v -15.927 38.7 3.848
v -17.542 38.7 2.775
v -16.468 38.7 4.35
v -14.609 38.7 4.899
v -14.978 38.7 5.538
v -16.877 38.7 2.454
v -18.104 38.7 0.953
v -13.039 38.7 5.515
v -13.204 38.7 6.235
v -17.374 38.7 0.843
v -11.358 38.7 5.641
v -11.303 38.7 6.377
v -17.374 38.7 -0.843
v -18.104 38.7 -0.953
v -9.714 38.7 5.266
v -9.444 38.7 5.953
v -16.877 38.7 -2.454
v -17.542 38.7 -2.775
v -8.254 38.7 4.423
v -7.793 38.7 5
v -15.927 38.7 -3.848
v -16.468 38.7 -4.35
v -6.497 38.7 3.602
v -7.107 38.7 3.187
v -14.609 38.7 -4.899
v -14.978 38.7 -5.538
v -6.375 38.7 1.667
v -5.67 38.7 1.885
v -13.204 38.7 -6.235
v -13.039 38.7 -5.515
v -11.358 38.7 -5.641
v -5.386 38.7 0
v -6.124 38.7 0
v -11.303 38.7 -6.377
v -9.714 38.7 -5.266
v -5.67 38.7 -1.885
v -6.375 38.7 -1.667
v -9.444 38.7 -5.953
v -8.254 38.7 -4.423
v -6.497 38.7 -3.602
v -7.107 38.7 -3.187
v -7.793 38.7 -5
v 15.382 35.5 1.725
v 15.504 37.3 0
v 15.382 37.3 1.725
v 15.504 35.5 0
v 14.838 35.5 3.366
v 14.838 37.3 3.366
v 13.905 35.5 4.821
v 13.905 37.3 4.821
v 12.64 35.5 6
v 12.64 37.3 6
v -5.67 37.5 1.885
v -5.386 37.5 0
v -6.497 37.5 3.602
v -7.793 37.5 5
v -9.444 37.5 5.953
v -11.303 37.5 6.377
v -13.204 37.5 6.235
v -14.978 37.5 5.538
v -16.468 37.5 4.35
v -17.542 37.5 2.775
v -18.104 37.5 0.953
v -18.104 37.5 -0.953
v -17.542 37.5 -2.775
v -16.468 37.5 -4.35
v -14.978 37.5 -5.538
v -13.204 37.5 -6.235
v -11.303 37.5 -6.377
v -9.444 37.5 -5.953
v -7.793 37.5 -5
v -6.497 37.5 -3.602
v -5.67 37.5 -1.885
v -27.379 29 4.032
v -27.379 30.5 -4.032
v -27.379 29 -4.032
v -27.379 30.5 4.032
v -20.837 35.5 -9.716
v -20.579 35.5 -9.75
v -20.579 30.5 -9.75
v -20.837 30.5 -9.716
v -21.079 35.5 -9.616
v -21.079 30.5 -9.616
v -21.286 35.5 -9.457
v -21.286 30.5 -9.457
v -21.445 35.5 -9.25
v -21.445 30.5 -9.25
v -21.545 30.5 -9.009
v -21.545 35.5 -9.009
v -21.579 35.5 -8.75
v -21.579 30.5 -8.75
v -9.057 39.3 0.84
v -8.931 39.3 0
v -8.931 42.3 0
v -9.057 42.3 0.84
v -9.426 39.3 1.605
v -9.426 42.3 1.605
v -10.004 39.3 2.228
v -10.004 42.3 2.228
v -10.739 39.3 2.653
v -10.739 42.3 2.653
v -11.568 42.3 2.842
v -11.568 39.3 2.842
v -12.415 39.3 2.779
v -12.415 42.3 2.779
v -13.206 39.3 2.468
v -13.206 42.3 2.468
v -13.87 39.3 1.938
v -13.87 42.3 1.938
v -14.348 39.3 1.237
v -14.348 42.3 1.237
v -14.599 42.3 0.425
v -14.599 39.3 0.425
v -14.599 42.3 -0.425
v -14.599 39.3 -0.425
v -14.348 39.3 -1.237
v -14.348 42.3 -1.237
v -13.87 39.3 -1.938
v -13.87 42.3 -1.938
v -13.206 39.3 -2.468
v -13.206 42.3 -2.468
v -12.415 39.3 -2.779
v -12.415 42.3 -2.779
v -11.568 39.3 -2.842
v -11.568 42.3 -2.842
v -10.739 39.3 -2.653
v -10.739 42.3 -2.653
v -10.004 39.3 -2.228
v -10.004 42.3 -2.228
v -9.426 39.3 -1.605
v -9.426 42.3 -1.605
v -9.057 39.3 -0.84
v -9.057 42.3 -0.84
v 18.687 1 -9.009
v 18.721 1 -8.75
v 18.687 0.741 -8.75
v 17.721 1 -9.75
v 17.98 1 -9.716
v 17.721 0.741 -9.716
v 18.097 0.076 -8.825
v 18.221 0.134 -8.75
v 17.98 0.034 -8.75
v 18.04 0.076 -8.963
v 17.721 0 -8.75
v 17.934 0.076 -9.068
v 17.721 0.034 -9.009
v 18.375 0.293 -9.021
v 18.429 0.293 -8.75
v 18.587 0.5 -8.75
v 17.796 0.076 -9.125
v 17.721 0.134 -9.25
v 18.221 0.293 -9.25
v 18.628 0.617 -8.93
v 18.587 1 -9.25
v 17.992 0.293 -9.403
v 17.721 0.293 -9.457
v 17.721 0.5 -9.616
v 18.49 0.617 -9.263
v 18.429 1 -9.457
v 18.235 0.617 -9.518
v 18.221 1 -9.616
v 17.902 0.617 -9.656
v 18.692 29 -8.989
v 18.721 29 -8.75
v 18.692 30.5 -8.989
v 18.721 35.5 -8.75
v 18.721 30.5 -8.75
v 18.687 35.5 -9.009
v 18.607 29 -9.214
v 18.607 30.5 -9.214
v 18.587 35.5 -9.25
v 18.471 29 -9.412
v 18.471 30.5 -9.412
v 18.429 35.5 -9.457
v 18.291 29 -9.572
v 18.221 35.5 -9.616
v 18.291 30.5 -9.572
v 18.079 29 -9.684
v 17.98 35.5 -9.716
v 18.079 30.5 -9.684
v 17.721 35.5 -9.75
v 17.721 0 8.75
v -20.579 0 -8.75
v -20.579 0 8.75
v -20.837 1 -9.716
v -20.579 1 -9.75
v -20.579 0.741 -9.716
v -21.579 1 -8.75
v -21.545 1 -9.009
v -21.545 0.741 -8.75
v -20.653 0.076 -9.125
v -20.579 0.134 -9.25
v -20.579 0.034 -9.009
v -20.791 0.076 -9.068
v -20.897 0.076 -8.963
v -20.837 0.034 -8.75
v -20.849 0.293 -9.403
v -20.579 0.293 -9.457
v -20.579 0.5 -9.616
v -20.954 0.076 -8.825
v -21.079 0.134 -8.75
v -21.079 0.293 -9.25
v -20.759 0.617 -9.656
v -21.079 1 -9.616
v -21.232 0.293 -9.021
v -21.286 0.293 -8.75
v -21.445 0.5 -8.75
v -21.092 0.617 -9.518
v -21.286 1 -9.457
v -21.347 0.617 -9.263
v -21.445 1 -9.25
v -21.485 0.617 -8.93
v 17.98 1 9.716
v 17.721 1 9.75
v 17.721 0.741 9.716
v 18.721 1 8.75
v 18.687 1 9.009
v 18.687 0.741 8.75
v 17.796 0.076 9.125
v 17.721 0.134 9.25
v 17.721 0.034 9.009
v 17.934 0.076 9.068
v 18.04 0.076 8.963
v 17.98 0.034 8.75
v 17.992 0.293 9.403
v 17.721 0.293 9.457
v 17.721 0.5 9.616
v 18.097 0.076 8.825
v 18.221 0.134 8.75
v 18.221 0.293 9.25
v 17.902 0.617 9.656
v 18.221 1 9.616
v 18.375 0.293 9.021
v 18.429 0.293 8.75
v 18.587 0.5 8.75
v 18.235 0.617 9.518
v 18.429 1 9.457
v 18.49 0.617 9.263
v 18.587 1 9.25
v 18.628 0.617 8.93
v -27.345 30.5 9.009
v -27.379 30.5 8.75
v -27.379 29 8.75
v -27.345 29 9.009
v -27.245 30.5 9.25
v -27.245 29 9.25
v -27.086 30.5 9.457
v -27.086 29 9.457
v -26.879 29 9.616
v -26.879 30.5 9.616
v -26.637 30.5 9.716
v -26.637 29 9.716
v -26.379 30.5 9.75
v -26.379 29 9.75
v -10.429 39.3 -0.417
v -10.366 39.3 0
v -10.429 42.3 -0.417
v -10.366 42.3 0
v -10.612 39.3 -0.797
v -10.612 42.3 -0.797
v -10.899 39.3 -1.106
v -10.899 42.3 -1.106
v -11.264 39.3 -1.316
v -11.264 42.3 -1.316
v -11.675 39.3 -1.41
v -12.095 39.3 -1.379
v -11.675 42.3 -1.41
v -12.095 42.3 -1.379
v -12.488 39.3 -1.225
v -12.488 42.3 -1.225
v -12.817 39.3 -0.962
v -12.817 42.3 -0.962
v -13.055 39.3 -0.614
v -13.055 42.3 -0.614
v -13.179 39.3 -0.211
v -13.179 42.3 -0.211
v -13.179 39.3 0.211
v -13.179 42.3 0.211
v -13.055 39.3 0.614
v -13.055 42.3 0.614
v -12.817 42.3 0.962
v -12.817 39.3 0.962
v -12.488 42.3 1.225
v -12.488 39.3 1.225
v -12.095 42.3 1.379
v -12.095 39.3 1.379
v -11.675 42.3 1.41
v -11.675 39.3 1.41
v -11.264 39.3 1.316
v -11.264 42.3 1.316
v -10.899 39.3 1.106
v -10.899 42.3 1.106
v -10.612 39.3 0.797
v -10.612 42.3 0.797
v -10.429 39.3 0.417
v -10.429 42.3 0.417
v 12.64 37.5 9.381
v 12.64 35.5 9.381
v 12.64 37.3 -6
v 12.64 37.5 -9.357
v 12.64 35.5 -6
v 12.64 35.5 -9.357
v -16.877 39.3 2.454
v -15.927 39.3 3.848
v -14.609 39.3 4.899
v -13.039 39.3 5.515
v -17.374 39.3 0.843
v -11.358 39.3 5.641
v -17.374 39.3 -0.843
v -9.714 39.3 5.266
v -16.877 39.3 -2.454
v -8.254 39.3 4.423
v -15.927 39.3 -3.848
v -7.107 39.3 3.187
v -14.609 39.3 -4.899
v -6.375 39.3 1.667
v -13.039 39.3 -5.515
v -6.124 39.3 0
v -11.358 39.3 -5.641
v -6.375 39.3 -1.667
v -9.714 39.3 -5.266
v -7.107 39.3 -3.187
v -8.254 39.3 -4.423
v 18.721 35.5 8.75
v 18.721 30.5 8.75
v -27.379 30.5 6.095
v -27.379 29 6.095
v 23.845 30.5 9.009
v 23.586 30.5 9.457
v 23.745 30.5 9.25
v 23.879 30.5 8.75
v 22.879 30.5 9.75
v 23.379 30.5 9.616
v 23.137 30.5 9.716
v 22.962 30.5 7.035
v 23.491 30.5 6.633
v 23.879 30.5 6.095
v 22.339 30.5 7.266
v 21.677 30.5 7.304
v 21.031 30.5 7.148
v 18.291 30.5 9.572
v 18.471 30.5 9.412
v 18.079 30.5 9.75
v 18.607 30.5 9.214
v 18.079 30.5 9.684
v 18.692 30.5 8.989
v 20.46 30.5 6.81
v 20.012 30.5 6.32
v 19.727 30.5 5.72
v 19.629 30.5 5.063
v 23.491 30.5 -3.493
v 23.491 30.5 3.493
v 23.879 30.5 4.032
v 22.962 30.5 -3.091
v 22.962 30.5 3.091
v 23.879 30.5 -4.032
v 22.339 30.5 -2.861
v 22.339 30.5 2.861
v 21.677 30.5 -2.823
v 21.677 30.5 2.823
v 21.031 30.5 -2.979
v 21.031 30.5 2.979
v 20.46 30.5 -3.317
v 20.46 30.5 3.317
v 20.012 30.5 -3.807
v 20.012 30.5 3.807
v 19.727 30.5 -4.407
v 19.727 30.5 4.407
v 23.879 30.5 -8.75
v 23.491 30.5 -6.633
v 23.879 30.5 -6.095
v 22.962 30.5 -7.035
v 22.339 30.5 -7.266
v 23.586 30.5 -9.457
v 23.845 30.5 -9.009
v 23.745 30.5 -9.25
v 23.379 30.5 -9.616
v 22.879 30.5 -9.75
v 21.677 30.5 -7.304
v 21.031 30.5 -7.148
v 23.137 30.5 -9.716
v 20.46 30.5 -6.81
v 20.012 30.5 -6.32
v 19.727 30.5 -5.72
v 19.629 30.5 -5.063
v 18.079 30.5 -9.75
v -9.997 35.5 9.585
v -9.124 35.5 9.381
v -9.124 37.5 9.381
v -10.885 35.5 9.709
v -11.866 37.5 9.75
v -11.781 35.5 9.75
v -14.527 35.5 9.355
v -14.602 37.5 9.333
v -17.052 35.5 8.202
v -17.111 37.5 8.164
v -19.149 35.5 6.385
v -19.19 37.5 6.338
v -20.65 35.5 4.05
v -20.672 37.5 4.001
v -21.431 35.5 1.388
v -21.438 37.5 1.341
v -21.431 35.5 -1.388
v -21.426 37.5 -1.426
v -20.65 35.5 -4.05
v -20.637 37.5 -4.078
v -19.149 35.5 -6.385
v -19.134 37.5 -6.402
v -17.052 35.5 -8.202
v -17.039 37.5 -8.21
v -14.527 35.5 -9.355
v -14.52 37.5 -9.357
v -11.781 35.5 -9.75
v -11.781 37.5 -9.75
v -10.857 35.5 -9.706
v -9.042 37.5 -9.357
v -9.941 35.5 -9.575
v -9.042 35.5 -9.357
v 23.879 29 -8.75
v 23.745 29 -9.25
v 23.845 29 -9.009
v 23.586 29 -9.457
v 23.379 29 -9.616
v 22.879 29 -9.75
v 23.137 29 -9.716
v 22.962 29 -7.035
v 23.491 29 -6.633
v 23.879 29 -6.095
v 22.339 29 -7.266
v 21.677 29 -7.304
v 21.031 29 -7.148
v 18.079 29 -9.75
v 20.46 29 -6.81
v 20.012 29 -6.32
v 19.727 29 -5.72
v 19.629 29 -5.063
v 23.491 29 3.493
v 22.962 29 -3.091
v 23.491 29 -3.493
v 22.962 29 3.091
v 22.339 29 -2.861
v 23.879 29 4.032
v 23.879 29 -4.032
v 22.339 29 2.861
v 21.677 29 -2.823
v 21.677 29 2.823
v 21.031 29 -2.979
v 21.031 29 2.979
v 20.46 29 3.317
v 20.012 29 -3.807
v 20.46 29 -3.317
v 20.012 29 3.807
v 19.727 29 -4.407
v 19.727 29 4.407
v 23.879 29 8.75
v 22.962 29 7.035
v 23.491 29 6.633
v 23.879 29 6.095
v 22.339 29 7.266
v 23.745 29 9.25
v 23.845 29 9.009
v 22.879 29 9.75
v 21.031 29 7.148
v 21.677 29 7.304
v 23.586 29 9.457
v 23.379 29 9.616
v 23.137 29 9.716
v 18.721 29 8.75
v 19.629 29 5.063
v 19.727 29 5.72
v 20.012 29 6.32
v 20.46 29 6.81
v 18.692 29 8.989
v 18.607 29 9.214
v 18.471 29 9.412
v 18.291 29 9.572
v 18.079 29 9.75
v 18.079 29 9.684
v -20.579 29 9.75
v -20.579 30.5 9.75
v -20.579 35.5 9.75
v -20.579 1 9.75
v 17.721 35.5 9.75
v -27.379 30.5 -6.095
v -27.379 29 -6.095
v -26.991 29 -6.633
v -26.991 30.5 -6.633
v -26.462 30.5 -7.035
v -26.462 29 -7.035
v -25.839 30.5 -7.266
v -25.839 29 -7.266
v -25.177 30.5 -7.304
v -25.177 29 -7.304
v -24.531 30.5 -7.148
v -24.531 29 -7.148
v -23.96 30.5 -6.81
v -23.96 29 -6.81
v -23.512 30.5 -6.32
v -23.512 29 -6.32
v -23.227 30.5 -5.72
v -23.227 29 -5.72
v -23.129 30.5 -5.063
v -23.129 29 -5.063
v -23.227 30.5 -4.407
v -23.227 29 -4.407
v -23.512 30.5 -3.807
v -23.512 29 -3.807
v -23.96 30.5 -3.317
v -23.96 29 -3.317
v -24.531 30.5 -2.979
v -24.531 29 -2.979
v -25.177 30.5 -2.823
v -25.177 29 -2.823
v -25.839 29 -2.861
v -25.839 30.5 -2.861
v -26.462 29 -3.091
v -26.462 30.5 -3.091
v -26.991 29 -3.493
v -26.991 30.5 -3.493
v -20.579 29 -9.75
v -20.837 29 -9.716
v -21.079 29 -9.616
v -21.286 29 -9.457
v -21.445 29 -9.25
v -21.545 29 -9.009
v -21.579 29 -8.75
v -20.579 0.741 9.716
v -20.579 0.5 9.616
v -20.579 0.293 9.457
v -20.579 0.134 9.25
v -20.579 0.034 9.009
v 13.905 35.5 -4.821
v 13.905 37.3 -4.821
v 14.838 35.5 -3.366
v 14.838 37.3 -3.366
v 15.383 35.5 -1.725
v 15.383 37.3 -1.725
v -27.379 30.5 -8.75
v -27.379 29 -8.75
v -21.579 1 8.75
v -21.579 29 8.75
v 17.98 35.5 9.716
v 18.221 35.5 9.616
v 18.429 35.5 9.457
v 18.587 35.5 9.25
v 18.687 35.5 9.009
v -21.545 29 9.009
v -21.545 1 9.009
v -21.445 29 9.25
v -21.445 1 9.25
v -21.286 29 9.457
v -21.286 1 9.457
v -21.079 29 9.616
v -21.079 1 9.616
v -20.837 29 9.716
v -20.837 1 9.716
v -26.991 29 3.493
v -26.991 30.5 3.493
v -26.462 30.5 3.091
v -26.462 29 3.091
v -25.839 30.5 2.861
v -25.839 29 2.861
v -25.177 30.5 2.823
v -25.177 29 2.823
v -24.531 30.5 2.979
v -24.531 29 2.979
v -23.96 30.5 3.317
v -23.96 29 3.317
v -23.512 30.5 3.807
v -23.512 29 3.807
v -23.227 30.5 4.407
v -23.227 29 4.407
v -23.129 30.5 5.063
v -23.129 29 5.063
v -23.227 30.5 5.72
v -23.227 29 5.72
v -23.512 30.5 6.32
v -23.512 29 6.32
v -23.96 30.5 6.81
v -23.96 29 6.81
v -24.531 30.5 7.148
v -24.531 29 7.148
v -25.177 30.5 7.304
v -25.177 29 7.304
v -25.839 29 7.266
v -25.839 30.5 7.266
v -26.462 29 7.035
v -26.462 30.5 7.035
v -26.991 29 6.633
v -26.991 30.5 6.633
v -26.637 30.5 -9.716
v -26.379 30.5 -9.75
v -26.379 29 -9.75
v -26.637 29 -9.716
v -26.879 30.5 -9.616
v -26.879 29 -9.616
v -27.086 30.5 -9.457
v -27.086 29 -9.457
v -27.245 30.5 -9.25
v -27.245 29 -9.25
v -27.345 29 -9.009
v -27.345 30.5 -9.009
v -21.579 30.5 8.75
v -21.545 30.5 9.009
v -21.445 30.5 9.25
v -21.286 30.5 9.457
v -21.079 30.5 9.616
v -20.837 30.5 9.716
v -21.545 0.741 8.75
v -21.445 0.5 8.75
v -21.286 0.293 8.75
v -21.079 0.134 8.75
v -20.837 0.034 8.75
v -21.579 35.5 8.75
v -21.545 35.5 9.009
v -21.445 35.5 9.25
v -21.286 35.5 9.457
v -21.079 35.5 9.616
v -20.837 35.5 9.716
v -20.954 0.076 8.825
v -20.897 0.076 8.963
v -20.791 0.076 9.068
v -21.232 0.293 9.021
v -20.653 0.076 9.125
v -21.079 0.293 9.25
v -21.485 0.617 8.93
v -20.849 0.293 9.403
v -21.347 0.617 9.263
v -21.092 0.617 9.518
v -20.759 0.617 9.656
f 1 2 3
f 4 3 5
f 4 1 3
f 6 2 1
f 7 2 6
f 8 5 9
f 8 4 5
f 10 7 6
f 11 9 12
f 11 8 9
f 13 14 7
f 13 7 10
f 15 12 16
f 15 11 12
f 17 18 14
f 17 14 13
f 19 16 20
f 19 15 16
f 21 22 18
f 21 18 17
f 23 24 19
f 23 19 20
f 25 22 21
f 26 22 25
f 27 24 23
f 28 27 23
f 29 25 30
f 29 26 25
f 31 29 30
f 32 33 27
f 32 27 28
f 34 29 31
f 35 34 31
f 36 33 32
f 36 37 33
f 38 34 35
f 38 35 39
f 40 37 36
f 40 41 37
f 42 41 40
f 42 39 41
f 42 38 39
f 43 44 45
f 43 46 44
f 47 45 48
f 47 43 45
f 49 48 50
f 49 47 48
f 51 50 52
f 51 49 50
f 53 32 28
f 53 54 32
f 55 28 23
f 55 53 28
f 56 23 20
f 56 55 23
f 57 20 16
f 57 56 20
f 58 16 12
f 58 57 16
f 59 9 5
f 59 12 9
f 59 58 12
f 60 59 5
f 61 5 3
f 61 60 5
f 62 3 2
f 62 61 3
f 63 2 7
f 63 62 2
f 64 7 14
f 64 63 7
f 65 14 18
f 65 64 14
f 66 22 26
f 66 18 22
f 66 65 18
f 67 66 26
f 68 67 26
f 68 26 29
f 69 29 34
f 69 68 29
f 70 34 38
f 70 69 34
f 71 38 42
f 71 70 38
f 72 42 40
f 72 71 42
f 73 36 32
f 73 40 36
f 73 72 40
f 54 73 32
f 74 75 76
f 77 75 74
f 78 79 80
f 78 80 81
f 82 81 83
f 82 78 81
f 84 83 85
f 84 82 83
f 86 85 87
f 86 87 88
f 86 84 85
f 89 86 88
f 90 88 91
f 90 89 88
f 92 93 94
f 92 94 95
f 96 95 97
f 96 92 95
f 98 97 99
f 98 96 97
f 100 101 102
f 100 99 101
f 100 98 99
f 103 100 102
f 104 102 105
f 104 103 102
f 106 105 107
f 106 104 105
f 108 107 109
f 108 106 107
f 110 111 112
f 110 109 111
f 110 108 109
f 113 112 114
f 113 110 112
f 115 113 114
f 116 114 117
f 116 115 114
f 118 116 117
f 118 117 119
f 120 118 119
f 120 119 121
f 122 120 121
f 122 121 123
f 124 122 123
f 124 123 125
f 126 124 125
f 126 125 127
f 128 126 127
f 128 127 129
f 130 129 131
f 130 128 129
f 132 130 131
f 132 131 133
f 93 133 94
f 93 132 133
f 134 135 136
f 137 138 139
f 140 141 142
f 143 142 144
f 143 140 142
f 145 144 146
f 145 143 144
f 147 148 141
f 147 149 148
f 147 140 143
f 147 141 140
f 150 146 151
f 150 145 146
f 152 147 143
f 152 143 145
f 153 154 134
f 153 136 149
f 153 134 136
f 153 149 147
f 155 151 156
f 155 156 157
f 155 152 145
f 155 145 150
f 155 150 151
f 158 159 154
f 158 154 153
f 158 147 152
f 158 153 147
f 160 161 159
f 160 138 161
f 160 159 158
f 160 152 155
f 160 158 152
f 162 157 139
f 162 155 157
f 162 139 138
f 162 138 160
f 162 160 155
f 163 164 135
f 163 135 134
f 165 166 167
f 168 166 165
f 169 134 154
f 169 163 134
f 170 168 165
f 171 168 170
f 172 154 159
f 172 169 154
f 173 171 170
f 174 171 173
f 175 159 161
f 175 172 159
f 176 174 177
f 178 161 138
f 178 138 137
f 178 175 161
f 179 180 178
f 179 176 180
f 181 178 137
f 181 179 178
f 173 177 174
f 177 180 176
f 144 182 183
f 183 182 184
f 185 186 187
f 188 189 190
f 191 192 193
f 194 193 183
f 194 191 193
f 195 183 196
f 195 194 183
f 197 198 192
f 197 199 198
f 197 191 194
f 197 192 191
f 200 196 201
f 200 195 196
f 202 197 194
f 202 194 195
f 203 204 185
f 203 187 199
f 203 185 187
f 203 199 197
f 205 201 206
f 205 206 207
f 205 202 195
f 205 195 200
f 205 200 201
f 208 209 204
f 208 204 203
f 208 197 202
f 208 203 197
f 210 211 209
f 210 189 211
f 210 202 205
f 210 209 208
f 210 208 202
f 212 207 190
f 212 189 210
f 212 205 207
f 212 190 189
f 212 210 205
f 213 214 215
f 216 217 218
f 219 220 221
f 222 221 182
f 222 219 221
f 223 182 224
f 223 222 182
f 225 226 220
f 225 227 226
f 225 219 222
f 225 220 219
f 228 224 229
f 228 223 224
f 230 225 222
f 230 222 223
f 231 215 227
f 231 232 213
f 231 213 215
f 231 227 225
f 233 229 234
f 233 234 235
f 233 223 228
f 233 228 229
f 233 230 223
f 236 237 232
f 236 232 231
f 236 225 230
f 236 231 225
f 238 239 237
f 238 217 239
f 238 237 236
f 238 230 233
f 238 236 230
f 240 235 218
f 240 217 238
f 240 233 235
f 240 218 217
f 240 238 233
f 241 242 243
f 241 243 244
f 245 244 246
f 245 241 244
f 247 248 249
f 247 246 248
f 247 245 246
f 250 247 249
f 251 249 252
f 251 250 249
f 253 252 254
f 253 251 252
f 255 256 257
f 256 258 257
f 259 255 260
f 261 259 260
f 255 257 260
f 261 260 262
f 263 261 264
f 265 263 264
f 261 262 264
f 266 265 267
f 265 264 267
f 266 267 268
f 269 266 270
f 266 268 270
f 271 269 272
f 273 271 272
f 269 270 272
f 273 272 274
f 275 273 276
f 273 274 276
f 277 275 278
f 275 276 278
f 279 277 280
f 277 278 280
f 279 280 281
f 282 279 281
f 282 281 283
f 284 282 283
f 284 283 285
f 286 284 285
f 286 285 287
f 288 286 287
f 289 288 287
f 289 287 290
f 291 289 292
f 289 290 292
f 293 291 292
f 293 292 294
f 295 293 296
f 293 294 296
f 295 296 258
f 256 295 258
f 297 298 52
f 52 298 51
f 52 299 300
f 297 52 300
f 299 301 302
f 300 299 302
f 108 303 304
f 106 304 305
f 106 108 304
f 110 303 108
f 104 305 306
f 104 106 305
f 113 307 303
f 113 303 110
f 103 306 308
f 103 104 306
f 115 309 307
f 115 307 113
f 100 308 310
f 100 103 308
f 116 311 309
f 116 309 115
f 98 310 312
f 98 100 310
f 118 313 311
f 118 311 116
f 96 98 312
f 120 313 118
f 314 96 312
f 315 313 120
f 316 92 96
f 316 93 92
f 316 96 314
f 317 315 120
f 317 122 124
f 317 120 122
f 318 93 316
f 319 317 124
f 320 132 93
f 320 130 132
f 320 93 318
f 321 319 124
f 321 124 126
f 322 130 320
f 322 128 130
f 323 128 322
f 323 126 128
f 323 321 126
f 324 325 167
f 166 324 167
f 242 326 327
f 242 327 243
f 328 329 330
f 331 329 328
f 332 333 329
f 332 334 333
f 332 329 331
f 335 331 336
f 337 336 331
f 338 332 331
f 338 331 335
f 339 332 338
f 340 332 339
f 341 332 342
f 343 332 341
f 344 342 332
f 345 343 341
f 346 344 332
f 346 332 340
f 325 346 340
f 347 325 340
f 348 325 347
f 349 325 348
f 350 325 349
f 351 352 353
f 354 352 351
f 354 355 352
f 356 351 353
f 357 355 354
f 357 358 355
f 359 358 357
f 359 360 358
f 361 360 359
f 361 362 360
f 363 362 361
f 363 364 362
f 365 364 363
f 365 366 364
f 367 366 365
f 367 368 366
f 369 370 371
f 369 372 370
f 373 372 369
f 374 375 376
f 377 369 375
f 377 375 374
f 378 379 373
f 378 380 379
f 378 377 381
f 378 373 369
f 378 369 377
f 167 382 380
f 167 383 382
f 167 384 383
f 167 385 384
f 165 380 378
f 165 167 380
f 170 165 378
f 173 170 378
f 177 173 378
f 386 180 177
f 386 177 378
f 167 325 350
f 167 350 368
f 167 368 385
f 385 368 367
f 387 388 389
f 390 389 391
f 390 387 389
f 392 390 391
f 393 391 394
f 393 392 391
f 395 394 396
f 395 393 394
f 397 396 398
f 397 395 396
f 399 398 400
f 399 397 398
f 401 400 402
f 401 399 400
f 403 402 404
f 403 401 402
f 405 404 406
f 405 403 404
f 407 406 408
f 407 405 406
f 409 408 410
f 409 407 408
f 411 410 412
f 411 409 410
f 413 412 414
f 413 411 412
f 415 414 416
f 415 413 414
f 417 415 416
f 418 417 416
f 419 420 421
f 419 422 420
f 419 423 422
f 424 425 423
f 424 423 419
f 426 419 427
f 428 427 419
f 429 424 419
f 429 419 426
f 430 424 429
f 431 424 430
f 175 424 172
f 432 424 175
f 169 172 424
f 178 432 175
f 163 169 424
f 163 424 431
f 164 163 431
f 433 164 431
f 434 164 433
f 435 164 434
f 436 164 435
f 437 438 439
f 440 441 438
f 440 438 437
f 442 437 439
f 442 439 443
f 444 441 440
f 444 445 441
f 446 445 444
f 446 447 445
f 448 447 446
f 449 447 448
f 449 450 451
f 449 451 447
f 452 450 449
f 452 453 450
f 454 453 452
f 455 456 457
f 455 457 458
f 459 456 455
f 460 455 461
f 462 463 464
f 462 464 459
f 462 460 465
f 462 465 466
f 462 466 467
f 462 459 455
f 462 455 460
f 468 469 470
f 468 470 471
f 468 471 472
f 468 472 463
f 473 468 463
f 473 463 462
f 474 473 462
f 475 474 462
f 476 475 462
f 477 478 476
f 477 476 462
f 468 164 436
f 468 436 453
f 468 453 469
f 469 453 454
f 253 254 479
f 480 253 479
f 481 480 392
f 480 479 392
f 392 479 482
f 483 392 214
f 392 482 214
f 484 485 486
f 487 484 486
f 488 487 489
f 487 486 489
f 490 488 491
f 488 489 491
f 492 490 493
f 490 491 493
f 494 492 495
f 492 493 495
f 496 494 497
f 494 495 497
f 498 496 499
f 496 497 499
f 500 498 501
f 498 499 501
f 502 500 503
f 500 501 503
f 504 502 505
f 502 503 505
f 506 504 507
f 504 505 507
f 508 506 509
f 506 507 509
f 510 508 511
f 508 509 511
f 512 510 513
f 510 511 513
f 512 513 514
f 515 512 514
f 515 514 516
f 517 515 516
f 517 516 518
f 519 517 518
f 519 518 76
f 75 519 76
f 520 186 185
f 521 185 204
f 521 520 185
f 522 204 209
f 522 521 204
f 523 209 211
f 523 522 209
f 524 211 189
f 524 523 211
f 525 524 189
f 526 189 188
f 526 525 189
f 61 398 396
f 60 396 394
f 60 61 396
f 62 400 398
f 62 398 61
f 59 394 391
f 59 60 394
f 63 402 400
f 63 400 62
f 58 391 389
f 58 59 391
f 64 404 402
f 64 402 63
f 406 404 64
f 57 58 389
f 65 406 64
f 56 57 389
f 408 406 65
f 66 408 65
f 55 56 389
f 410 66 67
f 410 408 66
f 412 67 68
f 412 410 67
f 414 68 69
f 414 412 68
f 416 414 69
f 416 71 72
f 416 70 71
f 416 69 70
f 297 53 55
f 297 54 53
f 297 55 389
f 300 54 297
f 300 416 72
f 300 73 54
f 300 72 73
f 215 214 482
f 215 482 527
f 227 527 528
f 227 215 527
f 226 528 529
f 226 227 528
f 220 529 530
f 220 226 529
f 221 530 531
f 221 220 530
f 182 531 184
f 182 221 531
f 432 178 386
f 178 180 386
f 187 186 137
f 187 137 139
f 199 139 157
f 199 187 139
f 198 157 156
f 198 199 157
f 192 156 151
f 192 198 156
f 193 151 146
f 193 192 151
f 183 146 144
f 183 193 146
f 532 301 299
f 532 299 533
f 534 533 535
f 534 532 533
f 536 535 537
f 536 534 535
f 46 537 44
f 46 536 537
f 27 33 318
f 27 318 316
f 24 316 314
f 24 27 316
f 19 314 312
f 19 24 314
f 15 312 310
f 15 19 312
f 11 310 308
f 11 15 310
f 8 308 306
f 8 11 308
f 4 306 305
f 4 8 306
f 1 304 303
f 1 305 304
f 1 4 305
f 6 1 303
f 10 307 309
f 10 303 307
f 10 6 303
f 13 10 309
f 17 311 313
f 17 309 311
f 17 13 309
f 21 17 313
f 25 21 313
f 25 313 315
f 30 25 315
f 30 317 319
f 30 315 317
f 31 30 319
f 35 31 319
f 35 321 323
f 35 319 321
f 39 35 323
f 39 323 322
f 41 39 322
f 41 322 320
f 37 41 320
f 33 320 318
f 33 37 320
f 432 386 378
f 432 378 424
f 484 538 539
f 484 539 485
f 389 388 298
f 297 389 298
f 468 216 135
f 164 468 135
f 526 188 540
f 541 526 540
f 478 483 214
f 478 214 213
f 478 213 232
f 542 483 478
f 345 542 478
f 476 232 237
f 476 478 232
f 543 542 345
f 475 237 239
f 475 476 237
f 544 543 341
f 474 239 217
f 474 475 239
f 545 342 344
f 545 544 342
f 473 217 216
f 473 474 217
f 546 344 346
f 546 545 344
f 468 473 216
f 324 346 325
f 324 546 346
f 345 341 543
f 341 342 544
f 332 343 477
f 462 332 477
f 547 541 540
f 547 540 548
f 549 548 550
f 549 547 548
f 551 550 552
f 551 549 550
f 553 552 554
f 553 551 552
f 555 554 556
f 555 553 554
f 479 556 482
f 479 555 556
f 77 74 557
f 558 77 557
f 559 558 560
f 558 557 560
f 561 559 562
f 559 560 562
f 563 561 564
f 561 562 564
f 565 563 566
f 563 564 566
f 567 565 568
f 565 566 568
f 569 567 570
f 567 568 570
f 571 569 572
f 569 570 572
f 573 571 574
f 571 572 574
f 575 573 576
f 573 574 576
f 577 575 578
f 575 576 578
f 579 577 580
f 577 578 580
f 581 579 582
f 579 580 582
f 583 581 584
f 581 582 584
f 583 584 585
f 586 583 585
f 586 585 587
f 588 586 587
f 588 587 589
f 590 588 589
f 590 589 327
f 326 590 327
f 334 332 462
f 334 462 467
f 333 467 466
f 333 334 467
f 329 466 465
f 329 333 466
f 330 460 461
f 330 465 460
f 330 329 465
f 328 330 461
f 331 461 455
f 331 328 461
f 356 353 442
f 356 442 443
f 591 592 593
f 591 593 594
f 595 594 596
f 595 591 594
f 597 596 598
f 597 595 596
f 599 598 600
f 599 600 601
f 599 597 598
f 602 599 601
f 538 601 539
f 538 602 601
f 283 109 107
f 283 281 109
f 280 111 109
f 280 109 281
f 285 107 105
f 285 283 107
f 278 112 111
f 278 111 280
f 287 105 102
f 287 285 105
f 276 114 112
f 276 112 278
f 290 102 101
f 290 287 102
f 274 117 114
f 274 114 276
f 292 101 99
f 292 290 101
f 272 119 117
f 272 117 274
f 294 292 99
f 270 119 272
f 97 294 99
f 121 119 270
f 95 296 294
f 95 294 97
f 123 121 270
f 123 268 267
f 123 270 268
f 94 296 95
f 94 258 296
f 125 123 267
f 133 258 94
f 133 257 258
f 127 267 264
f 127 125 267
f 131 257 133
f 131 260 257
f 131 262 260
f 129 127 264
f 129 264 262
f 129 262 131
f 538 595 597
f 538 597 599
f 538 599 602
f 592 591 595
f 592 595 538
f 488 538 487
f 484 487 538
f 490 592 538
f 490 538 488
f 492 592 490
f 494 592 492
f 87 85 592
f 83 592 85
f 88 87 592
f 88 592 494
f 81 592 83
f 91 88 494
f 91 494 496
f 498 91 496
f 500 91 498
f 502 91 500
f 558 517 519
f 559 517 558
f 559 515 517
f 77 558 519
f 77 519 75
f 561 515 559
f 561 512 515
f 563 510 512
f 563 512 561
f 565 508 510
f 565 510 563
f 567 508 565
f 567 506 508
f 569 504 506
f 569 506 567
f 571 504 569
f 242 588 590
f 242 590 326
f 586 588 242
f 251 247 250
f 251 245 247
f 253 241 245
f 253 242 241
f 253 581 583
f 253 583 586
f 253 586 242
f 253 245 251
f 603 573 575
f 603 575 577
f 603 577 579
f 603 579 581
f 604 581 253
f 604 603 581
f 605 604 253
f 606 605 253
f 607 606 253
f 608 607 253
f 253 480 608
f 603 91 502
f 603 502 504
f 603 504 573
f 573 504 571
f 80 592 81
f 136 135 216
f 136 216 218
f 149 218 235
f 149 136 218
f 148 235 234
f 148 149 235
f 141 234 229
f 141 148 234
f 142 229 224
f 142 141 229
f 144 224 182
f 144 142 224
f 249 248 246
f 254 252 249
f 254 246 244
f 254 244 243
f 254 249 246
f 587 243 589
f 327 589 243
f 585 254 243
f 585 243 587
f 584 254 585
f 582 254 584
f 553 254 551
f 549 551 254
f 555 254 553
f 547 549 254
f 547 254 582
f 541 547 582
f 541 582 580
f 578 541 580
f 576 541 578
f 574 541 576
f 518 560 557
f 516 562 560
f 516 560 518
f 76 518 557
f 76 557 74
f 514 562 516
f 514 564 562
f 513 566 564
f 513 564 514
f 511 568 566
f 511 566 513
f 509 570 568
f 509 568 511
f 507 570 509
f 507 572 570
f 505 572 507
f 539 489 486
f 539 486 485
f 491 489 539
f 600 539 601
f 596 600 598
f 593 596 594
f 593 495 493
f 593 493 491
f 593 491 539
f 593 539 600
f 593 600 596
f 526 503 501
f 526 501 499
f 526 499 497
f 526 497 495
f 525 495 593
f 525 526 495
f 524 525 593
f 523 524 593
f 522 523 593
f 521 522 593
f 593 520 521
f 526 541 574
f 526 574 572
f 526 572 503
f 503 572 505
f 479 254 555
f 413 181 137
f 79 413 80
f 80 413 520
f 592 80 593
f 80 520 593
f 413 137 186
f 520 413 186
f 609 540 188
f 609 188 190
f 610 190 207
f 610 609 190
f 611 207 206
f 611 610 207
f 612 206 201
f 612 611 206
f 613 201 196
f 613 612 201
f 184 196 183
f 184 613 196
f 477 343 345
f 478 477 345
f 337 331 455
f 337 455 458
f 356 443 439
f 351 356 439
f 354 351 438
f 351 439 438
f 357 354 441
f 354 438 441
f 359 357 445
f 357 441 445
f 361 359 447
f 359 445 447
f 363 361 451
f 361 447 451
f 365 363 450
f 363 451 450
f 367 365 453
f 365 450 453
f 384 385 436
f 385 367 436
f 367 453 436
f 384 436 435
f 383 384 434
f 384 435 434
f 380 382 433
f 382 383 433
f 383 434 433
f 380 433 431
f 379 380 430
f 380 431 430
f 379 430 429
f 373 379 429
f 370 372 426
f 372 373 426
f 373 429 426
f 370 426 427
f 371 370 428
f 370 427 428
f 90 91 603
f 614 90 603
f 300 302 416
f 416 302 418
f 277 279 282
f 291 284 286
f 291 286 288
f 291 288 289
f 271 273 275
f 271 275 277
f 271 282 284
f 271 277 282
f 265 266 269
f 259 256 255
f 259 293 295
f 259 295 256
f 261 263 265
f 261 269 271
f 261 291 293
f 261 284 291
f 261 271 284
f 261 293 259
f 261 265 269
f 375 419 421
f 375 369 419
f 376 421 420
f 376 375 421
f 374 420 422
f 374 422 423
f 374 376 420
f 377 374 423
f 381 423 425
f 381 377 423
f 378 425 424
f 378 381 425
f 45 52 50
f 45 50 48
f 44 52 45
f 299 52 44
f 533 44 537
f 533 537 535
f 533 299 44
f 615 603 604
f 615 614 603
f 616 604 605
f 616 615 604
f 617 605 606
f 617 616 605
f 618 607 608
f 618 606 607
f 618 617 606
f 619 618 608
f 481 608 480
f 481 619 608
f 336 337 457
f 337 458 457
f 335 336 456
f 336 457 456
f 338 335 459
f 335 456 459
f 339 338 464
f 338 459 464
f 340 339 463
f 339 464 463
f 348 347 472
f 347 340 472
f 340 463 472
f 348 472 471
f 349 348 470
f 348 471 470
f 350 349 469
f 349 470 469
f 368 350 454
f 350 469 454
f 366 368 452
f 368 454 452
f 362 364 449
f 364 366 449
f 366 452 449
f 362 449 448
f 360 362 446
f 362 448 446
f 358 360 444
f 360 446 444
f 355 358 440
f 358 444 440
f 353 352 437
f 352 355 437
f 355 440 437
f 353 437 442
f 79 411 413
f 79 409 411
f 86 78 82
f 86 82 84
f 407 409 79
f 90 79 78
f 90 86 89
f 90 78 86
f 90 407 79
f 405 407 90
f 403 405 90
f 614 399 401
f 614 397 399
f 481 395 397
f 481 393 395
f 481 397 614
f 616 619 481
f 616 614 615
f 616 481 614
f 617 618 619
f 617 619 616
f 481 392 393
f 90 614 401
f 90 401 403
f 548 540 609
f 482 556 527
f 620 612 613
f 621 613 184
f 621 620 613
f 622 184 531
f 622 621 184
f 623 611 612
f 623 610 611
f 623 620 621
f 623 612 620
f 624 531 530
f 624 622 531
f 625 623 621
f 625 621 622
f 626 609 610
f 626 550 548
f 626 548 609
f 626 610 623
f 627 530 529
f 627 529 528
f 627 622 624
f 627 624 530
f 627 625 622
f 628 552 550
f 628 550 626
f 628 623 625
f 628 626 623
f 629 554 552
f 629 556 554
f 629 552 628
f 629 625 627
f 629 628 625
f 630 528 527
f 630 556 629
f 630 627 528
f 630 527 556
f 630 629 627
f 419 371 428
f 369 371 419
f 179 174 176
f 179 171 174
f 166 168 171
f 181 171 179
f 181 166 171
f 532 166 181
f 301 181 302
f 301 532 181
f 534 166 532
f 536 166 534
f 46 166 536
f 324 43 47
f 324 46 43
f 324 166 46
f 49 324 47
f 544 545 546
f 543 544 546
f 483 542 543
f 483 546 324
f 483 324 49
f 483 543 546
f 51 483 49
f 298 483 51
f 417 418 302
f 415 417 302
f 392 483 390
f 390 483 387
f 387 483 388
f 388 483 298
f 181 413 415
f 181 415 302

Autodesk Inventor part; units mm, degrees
ref_plane "XZ Plane" through (0, 0, 0) normal (0, 1, 0) x (-1, 0, 0)
ref_plane "XY Plane" through (0, 0, 0) normal (0, 0, 1) x (1, 0, 0)
sketch "Sketch4" plane through (0, 0, 0) normal (0, 1, 0) x (-1, 0, 0)
  line L0 (21.5786, 9.75) -> (-18.7214, 9.75)
  line L1 (-18.7214, 9.75) -> (-18.7214, -9.75)
  line L2 (-18.7214, -9.75) -> (21.5786, -9.75)
  line L3 (21.5786, -9.75) -> (21.5786, 9.75)
  point P0 (0, 0)
  point P1 (21.5786, 0)
  dimension "d6" = 19.5
  dimension "d7" = 40.3
extrude "Extrusion2" add sketch "Sketch4" along normal blind 35.5
sketch "Sketch5" plane through (0, 35.5, 0) normal (0, 1, 0) x (1, 0, 0)
  point P0 (0, 0)
sketch "Sketch6" plane through (0, 35.5, 0) normal (0, 1, 0) x (1, 0, 0)
  point P0 (0, 0)
sketch "Sketch7" plane through (0, 35.5, 0) normal (0, 1, 0) x (1, 0, 0)
  point P0 (0, 0)
sketch "Sketch9" plane through (0, 35.5, 0) normal (0, 1, 0) x (1, 0, 0)
  circle A0 centre (-11.7806, 0) radius 9.75
  line L0 (18.7214, 9.75) -> (-21.5786, 9.75) projected
  point P0 (0, 0)
extrude "Extrusion3" add sketch "Sketch9" along normal blind 2
sketch "Sketch12" plane through (0, 35.5, 0) normal (0, 1, 0) x (1, 0, 0)
  arc A0 (-11.7806, -9.75) -> (-11.7806, 9.75) centre (-11.7806, 0) ccw projected
  arc A1 (-9.1237, -9.381) -> (-9.0416, 9.3574) centre (-11.7806, 0) ccw
  line L0 (-9.1237, -9.381) -> (12.6403, -9.381)
  line L1 (12.6403, -9.381) -> (12.6403, 9.3574)
  line L2 (12.6403, 9.3574) -> (-9.0416, 9.3574)
  point P0 (0, 0)
extrude "Extrusion4" add sketch "Sketch12" along normal blind 2
sketch "Sketch13" plane through (0, 35.5, 0) normal (0, 1, 0) x (1, 0, 0)
  line L0 (-21.5786, 9.75) -> (-21.5786, -9.75) construction
  line L1 (-21.5786, 0) -> (18, 0) construction
  line L2 (12.6403, -9.381) -> (12.6403, 9.3574) projected
  arc A0 (12.6403, -6) -> (15.5036, 0) centre (8.5831, -0.3807) ccw
  arc A1 (15.5036, 0) -> (12.6403, 6) centre (8.5831, 0.3807) ccw
  line L3 (12.6403, -6) -> (12.6403, 6)
  line L4 (12.6403, 9.3574) -> (12.6403, -9.381) projected
  point P0 (0, 0)
extrude "Extrusion5" add sketch "Sketch13" along normal blind 1.8
sketch "Sketch14" plane through (0, 37.5, 0) normal (0, 1, 0) x (1, 0, 0)
  arc A0 (-9.0416, 9.3574) -> (-9.1237, -9.381) centre (-11.7806, 0) ccw projected
  circle A1 centre (-11.7806, 0) radius 6.395
  point P0 (0, 0)
  dimension "d16" = 12.79
extrude "Extrusion6" add sketch "Sketch14" along normal blind 1.2
sketch "Sketch16" plane through (-11.7806, 38.7, 0) normal (0, 1, 0) x (1, 0, 0)
  circle A0 centre (0, 0) radius 6.395 projected
  circle A1 centre (0, 0) radius 5.6569
  point P0 (11.7806, 0)
extrude "Extrusion7" add sketch "Sketch16" along normal blind 0.6 contours A1
sketch "Sketch17" plane through (-11.7806, 39.3, 0) normal (0, 1, 0) x (1, 0, 0)
  circle A0 centre (0, 0) radius 6.395 projected
  circle A1 centre (0, 0) radius 2.85
  point P0 (11.7806, 0)
  dimension "d21" = 5.7
extrude "Extrusion8" add sketch "Sketch17" along normal blind 3 contours A1
sketch "Sketch18" plane through (-11.7806, 42.3, 0) normal (0, 1, 0) x (1, 0, 0)
  circle A0 centre (0, 0) radius 2.85 projected
  circle A1 centre (0, 0) radius 1.4142
  point P0 (11.7806, 0)
extrude "Extrusion9" cut sketch "Sketch18" against normal blind 3 contours A1
sketch "Sketch19" plane through (-21.5786, 0, -9.75) normal (-1, 0, 0) x (0, 0, 1)
  line L0 (0, 35.5) -> (0, 30.5) construction
  line L1 (19.5, 0) -> (19.5, 35.5) projected
  line L2 (0, 30.5) -> (19.5, 30.5)
  line L3 (19.5, 30.5) -> (19.5, 29)
  line L4 (19.5, 29) -> (0, 29)
  line L5 (0, 29) -> (0, 30.5)
  point P0 (9.75, 0)
  dimension "d26" = 5
extrude "Extrusion10" add sketch "Sketch19" along normal blind 5.8
sketch "Sketch20" plane through (-21.5786, 30.5, 9.75) normal (0, 1, 0) x (1, 0, 0)
  point P0 (21.5786, 9.75)
sketch "Sketch22" plane through (-21.5786, 30.5, 9.75) normal (0, 1, 0) x (1, 0, 0)
  circle A0 centre (-3.8003, 4.6866) radius 2.25
  line L0 (-11.4938, 9.75) -> (0.0481, 9.75) construction
  arc A1 (9.7981, 19.5) -> (9.7981, 0) centre (9.7981, 9.75) ccw construction
  circle A2 centre (-3.8003, 14.8134) radius 2.25
  point P0 (21.5786, 9.75)
  dimension "d29" = 4.5
hole "Hole1" at (-25.3789, 30.5, 5.0634) at (-25.3789, 30.5, -5.0634) direction (0, -1, 0) diameter 4.5 depth 8 tip angle 118
fillet "Fillet1" radius 1 1 edges at (-27.3786, 29.75, 9.75)
fillet "Fillet2" radius 1 1 edges at (-27.3786, 29.75, -9.75)
fillet "Fillet3" radius 1 4 edges at (-21.5786, 33, 9.75) (-21.5786, 33, -9.75) (18.7214, 17.75, 9.75) (18.7214, 17.75, -9.75)
fillet "Fillet4" radius 1 2 edges at (-21.5786, 14.5, 9.75) (-21.5786, 14.5, -9.75)
ref_plane "Work Plane4" through (-1.75, 0, 0) normal (1, 0, 0) x (0, 1, 0)
mirror "Mirror2" about plane through (-1.75, 0, 0) normal (1, 0, 0) of "Extrusion10", "Hole1", "Fillet1", "Fillet2"
fillet "Fillet5" radius 1 8 edges at (-1.4286, 0, 9.75) (18.4285, 0, 9.4571) (18.7214, 0, 0) (18.4285, 0, -9.4571) (-1.4286, 0, -9.75) (-21.2858, 0, -9.4571) (-21.5786, 0, 0) (-21.2858, 0, 9.4571)
sketch "Sketch26" plane through (0, 35.5, 0) normal (0, 1, 0) x (1, 0, 0)
  point P0 (0, 0)
properties part number "servo"
